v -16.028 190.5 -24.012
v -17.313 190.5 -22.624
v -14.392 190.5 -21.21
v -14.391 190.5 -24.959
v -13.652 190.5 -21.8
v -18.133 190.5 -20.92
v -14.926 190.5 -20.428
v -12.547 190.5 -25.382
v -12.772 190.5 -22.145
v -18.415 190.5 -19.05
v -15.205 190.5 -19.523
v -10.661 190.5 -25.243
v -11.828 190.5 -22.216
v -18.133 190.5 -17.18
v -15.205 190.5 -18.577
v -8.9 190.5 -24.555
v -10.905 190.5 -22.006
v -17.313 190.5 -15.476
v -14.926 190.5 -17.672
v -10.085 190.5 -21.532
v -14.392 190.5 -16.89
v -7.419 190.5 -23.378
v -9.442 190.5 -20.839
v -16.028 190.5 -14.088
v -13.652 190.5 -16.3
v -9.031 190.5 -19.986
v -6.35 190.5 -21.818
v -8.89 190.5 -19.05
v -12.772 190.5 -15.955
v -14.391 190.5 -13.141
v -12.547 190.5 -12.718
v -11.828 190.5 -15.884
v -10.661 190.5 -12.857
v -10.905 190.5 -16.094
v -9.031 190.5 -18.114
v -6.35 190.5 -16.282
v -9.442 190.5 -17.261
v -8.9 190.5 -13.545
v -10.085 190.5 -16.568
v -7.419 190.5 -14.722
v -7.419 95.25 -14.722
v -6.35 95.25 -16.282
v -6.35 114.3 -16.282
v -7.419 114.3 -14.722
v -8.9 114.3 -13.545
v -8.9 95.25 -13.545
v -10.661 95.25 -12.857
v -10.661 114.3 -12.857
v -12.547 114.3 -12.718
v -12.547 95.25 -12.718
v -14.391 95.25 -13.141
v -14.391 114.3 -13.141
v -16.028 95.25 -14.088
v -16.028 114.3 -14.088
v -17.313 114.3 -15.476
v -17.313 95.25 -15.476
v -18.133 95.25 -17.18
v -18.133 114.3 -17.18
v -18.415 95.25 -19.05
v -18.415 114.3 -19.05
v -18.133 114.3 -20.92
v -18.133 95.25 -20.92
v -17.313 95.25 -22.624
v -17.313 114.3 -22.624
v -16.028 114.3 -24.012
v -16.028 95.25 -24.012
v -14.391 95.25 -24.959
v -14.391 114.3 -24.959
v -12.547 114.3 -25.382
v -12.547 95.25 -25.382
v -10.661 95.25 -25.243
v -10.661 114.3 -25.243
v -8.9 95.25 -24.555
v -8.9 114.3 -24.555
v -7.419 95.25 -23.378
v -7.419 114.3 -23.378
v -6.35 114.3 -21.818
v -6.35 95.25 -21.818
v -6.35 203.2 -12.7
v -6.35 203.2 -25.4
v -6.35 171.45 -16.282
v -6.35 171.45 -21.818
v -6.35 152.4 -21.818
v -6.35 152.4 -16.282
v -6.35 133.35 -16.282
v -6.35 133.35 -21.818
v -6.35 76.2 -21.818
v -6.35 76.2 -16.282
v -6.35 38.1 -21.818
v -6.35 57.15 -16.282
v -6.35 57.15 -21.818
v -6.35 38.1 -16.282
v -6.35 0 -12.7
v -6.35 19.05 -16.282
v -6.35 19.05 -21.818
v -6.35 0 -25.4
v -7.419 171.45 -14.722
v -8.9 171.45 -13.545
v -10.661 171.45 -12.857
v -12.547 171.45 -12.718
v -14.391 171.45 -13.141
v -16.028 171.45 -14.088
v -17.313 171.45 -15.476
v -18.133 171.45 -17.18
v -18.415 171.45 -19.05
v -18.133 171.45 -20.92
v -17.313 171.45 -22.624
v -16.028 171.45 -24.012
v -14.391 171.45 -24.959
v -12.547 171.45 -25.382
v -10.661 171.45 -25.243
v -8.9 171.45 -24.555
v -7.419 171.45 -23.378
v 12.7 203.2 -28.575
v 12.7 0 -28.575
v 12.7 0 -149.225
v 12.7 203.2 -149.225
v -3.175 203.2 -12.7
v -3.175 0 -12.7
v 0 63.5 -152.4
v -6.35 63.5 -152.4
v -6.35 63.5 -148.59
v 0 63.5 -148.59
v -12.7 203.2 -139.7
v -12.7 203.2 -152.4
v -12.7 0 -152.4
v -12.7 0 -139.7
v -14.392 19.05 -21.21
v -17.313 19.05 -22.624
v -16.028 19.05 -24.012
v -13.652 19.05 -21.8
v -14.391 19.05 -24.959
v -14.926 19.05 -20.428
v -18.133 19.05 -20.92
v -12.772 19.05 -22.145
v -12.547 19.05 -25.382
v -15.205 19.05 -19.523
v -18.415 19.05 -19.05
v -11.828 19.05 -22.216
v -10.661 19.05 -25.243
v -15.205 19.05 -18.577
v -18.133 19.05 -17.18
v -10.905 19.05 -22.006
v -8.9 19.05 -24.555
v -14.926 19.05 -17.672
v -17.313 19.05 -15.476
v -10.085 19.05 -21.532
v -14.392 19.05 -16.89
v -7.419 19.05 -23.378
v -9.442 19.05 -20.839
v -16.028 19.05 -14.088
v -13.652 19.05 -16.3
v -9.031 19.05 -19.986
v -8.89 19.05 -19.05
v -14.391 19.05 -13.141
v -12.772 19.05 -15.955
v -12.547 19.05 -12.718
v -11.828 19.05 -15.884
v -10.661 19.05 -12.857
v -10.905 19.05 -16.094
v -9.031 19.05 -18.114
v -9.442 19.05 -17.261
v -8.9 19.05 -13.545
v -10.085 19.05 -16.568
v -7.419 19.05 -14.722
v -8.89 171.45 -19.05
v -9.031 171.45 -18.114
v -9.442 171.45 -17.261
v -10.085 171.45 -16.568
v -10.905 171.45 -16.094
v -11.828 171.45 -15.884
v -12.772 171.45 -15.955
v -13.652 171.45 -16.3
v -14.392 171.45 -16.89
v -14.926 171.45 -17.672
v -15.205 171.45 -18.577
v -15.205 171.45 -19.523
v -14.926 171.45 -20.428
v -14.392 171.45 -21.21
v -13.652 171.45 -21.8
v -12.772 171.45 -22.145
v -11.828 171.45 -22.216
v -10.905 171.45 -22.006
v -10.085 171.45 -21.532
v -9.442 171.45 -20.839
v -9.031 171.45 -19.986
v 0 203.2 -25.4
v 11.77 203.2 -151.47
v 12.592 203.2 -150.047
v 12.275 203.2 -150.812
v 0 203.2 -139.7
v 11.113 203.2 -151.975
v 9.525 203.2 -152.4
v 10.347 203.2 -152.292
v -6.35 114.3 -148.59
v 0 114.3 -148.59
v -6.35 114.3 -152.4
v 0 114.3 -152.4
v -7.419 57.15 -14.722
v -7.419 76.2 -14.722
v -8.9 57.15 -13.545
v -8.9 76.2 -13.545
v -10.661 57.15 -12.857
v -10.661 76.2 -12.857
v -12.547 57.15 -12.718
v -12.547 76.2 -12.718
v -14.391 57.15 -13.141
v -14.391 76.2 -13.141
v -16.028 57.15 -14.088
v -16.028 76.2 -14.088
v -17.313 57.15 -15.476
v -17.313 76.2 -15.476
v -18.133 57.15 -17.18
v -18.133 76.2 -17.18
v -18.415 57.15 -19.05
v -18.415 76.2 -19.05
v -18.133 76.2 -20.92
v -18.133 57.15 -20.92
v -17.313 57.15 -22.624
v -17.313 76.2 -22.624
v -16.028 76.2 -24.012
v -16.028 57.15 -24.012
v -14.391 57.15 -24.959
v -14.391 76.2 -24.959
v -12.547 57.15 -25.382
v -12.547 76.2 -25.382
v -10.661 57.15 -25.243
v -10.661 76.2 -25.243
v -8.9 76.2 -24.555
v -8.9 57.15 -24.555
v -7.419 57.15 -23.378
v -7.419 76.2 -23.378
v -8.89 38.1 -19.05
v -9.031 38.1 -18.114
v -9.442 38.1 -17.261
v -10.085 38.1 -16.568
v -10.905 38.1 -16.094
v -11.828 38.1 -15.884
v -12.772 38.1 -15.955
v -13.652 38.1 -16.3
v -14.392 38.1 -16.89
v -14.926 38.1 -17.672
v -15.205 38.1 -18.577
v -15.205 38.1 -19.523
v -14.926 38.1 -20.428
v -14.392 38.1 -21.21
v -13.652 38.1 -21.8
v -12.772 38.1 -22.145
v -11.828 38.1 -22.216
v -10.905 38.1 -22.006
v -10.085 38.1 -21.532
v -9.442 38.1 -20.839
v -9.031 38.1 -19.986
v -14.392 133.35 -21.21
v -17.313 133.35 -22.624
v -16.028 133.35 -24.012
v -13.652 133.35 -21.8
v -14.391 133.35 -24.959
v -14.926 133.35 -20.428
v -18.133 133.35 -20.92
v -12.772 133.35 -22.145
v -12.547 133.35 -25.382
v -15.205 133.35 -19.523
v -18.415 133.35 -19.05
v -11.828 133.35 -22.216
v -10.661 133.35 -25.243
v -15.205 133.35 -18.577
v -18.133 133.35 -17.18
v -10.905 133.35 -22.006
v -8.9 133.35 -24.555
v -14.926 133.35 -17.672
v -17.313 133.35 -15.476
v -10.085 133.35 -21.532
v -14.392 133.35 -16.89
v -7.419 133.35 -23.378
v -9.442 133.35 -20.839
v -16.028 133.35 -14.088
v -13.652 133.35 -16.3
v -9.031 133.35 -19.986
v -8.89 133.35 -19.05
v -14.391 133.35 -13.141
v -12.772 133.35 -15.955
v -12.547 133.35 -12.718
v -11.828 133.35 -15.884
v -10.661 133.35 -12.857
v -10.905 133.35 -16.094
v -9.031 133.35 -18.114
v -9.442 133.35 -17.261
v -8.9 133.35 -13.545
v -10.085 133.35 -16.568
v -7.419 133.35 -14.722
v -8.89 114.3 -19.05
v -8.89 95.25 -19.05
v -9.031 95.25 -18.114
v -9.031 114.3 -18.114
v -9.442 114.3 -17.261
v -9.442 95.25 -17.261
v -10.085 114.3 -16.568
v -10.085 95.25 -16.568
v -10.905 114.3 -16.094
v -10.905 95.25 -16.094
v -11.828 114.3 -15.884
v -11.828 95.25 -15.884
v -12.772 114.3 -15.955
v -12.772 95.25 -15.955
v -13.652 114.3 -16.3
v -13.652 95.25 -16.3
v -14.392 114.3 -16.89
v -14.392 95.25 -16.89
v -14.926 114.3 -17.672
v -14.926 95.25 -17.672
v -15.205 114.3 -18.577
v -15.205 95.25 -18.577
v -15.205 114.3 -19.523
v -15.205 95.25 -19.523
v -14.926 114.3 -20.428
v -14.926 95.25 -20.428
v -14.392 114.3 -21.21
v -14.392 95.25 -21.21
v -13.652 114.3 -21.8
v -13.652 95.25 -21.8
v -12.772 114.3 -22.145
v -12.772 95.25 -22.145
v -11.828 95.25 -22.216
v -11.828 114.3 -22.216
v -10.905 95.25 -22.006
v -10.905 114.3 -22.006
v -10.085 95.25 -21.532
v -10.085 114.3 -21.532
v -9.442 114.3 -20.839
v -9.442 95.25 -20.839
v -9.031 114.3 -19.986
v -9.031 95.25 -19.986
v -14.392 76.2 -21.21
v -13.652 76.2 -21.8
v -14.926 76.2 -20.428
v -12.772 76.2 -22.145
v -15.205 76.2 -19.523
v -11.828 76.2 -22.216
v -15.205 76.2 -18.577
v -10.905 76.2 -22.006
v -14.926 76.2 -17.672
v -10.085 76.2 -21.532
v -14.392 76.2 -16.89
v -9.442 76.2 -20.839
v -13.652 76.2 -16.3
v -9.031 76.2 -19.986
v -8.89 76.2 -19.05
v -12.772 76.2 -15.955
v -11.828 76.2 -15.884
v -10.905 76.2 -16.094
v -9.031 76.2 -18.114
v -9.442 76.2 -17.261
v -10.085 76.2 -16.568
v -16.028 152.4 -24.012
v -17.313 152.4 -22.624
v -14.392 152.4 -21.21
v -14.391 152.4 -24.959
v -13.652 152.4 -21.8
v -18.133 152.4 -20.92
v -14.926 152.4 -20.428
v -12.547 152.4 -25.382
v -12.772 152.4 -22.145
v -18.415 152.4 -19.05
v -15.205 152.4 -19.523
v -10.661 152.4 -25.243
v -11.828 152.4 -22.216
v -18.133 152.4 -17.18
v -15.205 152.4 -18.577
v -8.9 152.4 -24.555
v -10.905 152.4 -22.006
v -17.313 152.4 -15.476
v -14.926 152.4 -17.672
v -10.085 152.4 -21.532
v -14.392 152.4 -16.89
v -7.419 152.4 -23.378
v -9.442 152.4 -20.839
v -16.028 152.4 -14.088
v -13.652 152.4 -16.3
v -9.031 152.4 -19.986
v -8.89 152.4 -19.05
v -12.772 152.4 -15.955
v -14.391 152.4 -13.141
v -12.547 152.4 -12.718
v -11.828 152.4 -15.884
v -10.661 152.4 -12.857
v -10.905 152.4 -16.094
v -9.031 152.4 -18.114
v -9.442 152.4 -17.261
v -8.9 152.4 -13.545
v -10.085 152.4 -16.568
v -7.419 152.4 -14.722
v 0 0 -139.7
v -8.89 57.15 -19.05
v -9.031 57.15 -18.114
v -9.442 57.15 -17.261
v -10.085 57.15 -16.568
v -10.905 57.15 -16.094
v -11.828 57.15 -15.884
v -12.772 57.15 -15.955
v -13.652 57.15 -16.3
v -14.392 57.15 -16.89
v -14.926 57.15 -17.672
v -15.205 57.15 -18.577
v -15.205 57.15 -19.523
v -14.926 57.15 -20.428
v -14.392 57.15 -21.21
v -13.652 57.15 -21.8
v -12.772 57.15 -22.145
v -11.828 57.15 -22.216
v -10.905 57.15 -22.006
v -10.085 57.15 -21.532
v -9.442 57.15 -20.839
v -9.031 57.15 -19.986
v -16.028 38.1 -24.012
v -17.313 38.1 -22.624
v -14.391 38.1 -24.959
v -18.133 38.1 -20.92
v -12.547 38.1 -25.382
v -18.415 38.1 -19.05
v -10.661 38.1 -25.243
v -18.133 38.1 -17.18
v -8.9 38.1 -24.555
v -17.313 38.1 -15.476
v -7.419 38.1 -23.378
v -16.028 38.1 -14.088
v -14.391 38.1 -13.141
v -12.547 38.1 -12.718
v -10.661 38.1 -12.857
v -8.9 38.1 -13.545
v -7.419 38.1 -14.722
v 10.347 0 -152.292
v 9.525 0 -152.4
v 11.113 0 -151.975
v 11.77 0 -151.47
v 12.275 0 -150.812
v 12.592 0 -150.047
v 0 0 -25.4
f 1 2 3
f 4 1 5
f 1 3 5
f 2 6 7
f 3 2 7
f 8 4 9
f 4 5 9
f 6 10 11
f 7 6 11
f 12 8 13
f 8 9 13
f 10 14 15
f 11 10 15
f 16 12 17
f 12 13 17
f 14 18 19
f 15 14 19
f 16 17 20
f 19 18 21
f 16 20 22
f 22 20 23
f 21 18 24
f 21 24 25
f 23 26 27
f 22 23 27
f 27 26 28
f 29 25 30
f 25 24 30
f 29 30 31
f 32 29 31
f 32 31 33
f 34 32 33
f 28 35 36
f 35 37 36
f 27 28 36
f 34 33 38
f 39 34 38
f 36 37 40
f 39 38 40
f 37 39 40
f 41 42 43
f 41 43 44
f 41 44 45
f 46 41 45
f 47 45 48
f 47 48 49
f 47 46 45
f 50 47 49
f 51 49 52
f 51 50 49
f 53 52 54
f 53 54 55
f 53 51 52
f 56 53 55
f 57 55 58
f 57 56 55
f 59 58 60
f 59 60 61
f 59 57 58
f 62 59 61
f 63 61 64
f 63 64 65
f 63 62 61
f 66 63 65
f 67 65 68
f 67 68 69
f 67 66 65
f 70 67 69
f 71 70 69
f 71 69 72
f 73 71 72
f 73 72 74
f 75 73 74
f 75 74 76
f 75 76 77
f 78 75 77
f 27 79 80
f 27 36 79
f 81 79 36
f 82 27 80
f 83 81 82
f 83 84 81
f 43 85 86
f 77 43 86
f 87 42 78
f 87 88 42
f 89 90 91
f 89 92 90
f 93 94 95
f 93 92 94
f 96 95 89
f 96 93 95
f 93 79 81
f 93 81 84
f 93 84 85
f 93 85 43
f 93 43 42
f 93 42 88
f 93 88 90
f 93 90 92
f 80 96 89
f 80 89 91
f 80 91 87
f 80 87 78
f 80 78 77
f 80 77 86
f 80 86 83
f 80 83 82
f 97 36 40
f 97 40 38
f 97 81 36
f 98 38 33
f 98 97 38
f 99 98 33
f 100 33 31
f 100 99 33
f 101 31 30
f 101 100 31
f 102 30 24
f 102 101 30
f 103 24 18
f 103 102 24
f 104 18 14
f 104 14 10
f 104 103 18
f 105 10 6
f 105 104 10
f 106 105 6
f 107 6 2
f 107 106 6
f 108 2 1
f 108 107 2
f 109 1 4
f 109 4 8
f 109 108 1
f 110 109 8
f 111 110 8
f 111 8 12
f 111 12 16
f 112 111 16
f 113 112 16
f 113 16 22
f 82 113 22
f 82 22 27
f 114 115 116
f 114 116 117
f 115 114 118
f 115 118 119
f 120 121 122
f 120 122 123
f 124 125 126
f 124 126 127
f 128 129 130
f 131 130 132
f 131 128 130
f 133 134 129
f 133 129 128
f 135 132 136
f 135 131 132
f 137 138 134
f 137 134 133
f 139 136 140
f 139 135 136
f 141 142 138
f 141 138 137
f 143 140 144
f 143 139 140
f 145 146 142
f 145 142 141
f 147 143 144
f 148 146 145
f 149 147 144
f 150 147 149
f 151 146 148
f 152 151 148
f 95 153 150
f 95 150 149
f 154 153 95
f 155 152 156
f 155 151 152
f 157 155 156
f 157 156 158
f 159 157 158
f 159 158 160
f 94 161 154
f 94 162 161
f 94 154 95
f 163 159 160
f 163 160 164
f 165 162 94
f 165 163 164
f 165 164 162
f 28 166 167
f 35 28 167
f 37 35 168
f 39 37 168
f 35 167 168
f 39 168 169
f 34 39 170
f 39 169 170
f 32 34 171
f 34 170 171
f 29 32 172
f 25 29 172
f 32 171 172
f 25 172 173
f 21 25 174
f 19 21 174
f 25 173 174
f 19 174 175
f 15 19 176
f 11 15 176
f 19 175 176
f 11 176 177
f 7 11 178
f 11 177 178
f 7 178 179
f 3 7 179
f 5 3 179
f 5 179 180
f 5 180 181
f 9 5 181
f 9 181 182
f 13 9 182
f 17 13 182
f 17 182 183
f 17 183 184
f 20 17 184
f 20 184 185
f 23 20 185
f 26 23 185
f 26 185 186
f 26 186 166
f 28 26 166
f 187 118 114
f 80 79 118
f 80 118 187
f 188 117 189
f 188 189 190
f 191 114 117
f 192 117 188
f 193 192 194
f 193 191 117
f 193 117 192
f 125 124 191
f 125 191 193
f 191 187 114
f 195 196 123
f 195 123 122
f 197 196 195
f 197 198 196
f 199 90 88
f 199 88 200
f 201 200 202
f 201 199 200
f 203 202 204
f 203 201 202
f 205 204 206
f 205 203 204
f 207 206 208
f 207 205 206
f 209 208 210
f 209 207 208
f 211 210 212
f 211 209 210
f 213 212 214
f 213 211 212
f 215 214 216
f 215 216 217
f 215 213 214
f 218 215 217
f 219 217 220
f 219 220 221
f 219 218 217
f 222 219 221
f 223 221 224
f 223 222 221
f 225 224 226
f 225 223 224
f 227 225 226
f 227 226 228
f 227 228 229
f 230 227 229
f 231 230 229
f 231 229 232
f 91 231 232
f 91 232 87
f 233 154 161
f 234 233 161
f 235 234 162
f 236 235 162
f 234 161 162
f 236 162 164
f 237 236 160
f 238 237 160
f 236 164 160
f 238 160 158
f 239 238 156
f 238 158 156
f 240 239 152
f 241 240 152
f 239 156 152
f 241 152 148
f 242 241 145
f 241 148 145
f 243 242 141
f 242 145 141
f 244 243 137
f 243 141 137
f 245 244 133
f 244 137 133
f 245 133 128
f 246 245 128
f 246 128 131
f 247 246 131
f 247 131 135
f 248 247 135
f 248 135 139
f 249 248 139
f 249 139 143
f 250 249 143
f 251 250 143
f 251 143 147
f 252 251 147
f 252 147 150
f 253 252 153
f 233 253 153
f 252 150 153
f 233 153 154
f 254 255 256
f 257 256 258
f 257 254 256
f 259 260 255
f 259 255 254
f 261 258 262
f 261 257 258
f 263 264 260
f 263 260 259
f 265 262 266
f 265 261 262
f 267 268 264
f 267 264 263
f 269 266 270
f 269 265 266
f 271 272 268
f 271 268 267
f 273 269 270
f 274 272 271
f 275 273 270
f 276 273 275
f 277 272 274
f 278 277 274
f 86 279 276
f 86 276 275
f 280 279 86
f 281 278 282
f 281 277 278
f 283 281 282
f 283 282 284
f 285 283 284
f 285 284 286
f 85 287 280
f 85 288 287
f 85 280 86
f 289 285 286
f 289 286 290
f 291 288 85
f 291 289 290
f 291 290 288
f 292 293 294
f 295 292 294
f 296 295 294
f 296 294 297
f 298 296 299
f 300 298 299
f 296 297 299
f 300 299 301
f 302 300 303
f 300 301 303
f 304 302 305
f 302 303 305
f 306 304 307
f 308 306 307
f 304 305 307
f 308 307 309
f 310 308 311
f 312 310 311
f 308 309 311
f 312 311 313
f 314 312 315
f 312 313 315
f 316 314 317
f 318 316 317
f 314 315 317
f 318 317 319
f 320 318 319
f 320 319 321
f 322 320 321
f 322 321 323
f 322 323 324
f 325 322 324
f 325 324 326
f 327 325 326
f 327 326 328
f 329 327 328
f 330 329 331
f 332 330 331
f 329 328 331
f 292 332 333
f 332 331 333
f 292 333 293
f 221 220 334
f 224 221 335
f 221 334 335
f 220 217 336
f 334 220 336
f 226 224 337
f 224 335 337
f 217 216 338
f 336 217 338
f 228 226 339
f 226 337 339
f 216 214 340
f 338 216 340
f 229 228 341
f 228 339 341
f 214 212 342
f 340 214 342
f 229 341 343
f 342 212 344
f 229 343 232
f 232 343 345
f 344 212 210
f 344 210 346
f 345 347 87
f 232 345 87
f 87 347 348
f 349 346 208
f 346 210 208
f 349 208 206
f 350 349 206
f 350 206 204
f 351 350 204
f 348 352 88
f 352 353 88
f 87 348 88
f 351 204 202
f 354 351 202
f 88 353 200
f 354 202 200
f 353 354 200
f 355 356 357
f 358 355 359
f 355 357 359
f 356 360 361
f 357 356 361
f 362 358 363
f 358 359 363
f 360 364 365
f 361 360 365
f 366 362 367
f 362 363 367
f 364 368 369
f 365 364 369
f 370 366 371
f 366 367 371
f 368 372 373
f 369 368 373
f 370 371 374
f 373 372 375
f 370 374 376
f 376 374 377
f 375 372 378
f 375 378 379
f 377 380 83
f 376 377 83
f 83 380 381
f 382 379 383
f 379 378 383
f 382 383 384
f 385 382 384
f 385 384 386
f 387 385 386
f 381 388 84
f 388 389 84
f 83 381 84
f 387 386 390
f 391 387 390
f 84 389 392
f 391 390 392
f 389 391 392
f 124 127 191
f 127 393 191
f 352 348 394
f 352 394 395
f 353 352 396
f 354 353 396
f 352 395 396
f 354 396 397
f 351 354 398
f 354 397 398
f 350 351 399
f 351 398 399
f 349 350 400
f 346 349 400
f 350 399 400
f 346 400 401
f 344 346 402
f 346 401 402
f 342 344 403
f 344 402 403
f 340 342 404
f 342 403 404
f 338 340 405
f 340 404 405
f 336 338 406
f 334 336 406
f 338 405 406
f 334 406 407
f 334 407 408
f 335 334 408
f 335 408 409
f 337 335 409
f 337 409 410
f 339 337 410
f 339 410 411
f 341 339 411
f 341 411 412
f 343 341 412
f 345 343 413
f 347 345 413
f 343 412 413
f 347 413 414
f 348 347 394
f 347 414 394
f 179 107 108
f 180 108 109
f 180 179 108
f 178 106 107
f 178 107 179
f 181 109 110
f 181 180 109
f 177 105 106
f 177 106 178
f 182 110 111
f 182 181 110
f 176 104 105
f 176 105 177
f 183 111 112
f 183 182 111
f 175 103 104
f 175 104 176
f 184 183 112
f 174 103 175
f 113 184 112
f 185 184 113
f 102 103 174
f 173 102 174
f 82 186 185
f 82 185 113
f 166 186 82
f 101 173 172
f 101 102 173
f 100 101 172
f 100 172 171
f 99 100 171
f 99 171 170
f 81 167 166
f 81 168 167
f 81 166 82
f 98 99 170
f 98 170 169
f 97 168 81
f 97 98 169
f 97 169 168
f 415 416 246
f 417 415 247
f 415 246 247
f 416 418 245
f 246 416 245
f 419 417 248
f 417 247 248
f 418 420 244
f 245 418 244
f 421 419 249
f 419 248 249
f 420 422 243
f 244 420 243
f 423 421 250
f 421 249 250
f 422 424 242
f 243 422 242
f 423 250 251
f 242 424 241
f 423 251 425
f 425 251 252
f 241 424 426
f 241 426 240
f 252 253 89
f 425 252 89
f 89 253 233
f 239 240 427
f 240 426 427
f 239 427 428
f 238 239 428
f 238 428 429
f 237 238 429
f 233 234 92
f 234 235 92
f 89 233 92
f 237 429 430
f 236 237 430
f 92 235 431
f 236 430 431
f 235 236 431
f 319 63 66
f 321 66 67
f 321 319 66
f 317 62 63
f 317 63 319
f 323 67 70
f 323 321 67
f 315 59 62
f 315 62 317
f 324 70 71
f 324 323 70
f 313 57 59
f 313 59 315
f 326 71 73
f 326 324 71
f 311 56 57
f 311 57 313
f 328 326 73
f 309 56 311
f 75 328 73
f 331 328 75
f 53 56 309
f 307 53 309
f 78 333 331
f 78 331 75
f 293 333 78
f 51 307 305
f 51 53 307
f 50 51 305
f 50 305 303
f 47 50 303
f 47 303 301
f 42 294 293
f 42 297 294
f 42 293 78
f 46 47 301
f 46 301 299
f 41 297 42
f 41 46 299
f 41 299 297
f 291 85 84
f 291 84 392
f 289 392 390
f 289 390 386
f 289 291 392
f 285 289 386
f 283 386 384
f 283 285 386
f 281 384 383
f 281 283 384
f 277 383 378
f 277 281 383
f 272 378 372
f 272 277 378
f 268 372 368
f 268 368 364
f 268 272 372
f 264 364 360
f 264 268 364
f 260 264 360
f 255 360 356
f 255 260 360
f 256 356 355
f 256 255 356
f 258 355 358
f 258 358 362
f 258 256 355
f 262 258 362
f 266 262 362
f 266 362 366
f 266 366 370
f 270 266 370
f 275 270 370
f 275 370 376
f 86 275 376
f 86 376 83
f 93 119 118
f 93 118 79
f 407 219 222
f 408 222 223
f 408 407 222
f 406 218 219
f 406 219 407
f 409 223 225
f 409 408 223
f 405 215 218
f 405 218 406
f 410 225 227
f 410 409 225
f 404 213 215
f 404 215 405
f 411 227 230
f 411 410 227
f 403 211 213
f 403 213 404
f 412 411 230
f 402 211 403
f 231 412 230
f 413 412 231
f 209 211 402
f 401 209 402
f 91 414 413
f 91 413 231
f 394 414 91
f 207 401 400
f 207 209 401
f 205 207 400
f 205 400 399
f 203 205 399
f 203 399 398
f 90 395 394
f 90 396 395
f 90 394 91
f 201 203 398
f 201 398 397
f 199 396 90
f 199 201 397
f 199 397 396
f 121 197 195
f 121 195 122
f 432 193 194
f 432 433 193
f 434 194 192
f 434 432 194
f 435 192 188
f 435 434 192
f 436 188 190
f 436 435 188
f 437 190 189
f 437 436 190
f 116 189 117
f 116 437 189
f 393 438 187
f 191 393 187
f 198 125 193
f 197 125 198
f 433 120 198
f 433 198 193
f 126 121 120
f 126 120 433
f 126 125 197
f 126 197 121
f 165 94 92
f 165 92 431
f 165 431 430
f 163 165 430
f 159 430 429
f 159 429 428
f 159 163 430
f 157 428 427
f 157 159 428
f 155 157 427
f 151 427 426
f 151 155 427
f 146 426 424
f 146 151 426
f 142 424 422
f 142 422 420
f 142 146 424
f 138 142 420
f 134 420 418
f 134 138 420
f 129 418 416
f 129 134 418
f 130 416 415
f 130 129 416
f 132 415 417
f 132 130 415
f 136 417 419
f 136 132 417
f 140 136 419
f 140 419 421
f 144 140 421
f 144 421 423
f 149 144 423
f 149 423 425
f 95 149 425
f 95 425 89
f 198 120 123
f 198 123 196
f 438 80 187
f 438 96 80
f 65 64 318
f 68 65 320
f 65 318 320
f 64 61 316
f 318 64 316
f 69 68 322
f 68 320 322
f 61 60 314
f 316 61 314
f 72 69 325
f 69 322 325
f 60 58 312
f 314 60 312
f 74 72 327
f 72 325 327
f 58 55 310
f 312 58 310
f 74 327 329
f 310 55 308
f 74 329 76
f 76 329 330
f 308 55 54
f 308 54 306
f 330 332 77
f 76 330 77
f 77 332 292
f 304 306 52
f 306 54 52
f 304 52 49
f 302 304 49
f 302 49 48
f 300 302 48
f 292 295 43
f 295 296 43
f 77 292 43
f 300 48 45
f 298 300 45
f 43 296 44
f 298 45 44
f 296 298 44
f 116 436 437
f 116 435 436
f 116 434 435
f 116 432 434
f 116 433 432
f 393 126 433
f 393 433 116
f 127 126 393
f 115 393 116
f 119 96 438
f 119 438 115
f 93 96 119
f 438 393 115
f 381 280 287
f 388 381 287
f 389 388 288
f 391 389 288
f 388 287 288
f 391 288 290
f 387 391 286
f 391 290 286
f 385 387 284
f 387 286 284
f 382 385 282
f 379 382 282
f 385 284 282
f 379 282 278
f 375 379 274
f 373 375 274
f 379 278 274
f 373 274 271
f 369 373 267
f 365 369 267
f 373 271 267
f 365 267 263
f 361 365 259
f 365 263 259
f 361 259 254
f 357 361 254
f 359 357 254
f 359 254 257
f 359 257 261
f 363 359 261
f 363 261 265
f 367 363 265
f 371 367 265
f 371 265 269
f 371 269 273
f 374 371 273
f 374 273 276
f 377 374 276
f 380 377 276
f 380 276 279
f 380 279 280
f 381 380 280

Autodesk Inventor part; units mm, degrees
ref_plane "YZ Plane" through (0, 0, 0) normal (1, 0, 0) x (0, 1, 0)
ref_plane "XZ Plane" through (0, 0, 0) normal (0, 1, 0) x (-1, 0, 0)
sketch "Sketch1" plane through (0, 0, 0) normal (1, 0, 0) x (0, 1, 0)
  line L0 (0, 0) -> (203.2, 0)
  line L1 (203.2, 0) -> (203.2, -152.4)
  line L2 (203.2, -152.4) -> (0, -152.4)
  line L3 (0, -152.4) -> (0, 0)
  dimension "d0" = 203.2
  dimension "d1" = 152.4
extrude "Extrusion1" add sketch "Sketch1" along normal blind 12.7
sketch "Sketch2" plane through (0, 0, 0) normal (-1, 0, 0) x (0, 0, 1)
  line L0 (-152.4, 0) -> (-152.4, 203.2) projected
  line L1 (-152.4, 203.2) -> (0, 203.2) projected
  line L2 (-152.4, 0) -> (-139.7, 0)
  line L3 (-139.7, 0) -> (-139.7, 203.2)
  line L4 (-139.7, 203.2) -> (-152.4, 203.2)
  line L5 (-152.4, 203.2) -> (-152.4, 0)
  point P0 (0, 0)
  dimension "d4" = 12.7
extrude "Extrusion2" add sketch "Sketch2" along normal blind 12.7
fillet "Fillet1" radius 3.175 1 edges at (12.7, 101.6, -152.4)
sketch "Sketch3" plane through (0, 0, 0) normal (0, -1, 0) x (1, 0, 0)
  line L0 (0, 0) -> (0, -12.7)
  line L1 (0, -12.7) -> (0, -25.4)
  line L2 (0, -12.7) -> (-6.35, -12.7)
  line L3 (-6.35, -12.7) -> (-6.35, -25.4)
  line L4 (-6.35, -25.4) -> (0, -25.4)
  dimension "d8" = 12.7
  dimension "d9" = 12.7
  dimension "d10" = 6.35
  dimension "d11" = 90
extrude "Extrusion3" add sketch "Sketch3" against normal up to surface (203.2 mm away)
ref_plane "Work Plane1" through (0, 19.05, 0) normal (0, -1, 0) x (1, 0, 0)
sketch "Sketch4" plane through (0, 19.05, 0) normal (0, -1, 0) x (1, 0, 0)
  line L0 (0, -19.05) -> (-12.065, -19.05)
  circle A0 centre (-12.065, -19.05) radius 3.175
  circle A1 centre (-12.065, -19.05) radius 6.35
  point P0 (0, 0)
  dimension "d15" = 12.065
  dimension "d16" = 6.35
  dimension "d17" = 12.7
  dimension "d18" = 19.05
  dimension "d19" = 19.05
extrude "Extrusion4" add sketch "Sketch4" against normal blind 19.05
pattern_linear "Rectangular Pattern1" count 5 spacing 38.1 along (0, 1, 0) of "Extrusion4"
sketch "Sketch5" plane through (0, 203.2, 0) normal (0, 1, 0) x (1, 0, 0)
  line L0 (0, 0) -> (12.7, 0)
  line L1 (12.7, 0) -> (12.7, 12.7)
  line L2 (12.7, 12.7) -> (0, 12.7)
  line L3 (0, 12.7) -> (0, 0)
  line L4 (12.7, 149.225) -> (12.7, 0) projected
extrude "Extrusion5" cut sketch "Sketch5" against normal blind 203.2
chamfer "Chamfer2" distance 15.875 angle 45 1 edges at (12.7, 101.6, -12.7)
sketch "Sketch6" plane through (-12.7, 0, -152.4) normal (0, 0, -1) x (-1, 0, 0)
  line L0 (0, 0) -> (0, 63.5)
  line L1 (0, 63.5) -> (-6.35, 63.5)
  line L2 (-12.7, 0) -> (-12.7, 203.2) projected
  line L3 (-6.35, 63.5) -> (-12.7, 63.5)
  line L4 (-12.7, 63.5) -> (-12.7, 114.3)
  line L5 (-12.7, 114.3) -> (-6.35, 114.3)
  line L6 (-6.35, 114.3) -> (-6.35, 63.5)
  dimension "d35" = 63.5
  dimension "d37" = 6.35
  dimension "d38" = 50.8
extrude "Extrusion6" cut sketch "Sketch6" against normal blind 3.81
properties part number "PhoneSafeDoor(H)"
